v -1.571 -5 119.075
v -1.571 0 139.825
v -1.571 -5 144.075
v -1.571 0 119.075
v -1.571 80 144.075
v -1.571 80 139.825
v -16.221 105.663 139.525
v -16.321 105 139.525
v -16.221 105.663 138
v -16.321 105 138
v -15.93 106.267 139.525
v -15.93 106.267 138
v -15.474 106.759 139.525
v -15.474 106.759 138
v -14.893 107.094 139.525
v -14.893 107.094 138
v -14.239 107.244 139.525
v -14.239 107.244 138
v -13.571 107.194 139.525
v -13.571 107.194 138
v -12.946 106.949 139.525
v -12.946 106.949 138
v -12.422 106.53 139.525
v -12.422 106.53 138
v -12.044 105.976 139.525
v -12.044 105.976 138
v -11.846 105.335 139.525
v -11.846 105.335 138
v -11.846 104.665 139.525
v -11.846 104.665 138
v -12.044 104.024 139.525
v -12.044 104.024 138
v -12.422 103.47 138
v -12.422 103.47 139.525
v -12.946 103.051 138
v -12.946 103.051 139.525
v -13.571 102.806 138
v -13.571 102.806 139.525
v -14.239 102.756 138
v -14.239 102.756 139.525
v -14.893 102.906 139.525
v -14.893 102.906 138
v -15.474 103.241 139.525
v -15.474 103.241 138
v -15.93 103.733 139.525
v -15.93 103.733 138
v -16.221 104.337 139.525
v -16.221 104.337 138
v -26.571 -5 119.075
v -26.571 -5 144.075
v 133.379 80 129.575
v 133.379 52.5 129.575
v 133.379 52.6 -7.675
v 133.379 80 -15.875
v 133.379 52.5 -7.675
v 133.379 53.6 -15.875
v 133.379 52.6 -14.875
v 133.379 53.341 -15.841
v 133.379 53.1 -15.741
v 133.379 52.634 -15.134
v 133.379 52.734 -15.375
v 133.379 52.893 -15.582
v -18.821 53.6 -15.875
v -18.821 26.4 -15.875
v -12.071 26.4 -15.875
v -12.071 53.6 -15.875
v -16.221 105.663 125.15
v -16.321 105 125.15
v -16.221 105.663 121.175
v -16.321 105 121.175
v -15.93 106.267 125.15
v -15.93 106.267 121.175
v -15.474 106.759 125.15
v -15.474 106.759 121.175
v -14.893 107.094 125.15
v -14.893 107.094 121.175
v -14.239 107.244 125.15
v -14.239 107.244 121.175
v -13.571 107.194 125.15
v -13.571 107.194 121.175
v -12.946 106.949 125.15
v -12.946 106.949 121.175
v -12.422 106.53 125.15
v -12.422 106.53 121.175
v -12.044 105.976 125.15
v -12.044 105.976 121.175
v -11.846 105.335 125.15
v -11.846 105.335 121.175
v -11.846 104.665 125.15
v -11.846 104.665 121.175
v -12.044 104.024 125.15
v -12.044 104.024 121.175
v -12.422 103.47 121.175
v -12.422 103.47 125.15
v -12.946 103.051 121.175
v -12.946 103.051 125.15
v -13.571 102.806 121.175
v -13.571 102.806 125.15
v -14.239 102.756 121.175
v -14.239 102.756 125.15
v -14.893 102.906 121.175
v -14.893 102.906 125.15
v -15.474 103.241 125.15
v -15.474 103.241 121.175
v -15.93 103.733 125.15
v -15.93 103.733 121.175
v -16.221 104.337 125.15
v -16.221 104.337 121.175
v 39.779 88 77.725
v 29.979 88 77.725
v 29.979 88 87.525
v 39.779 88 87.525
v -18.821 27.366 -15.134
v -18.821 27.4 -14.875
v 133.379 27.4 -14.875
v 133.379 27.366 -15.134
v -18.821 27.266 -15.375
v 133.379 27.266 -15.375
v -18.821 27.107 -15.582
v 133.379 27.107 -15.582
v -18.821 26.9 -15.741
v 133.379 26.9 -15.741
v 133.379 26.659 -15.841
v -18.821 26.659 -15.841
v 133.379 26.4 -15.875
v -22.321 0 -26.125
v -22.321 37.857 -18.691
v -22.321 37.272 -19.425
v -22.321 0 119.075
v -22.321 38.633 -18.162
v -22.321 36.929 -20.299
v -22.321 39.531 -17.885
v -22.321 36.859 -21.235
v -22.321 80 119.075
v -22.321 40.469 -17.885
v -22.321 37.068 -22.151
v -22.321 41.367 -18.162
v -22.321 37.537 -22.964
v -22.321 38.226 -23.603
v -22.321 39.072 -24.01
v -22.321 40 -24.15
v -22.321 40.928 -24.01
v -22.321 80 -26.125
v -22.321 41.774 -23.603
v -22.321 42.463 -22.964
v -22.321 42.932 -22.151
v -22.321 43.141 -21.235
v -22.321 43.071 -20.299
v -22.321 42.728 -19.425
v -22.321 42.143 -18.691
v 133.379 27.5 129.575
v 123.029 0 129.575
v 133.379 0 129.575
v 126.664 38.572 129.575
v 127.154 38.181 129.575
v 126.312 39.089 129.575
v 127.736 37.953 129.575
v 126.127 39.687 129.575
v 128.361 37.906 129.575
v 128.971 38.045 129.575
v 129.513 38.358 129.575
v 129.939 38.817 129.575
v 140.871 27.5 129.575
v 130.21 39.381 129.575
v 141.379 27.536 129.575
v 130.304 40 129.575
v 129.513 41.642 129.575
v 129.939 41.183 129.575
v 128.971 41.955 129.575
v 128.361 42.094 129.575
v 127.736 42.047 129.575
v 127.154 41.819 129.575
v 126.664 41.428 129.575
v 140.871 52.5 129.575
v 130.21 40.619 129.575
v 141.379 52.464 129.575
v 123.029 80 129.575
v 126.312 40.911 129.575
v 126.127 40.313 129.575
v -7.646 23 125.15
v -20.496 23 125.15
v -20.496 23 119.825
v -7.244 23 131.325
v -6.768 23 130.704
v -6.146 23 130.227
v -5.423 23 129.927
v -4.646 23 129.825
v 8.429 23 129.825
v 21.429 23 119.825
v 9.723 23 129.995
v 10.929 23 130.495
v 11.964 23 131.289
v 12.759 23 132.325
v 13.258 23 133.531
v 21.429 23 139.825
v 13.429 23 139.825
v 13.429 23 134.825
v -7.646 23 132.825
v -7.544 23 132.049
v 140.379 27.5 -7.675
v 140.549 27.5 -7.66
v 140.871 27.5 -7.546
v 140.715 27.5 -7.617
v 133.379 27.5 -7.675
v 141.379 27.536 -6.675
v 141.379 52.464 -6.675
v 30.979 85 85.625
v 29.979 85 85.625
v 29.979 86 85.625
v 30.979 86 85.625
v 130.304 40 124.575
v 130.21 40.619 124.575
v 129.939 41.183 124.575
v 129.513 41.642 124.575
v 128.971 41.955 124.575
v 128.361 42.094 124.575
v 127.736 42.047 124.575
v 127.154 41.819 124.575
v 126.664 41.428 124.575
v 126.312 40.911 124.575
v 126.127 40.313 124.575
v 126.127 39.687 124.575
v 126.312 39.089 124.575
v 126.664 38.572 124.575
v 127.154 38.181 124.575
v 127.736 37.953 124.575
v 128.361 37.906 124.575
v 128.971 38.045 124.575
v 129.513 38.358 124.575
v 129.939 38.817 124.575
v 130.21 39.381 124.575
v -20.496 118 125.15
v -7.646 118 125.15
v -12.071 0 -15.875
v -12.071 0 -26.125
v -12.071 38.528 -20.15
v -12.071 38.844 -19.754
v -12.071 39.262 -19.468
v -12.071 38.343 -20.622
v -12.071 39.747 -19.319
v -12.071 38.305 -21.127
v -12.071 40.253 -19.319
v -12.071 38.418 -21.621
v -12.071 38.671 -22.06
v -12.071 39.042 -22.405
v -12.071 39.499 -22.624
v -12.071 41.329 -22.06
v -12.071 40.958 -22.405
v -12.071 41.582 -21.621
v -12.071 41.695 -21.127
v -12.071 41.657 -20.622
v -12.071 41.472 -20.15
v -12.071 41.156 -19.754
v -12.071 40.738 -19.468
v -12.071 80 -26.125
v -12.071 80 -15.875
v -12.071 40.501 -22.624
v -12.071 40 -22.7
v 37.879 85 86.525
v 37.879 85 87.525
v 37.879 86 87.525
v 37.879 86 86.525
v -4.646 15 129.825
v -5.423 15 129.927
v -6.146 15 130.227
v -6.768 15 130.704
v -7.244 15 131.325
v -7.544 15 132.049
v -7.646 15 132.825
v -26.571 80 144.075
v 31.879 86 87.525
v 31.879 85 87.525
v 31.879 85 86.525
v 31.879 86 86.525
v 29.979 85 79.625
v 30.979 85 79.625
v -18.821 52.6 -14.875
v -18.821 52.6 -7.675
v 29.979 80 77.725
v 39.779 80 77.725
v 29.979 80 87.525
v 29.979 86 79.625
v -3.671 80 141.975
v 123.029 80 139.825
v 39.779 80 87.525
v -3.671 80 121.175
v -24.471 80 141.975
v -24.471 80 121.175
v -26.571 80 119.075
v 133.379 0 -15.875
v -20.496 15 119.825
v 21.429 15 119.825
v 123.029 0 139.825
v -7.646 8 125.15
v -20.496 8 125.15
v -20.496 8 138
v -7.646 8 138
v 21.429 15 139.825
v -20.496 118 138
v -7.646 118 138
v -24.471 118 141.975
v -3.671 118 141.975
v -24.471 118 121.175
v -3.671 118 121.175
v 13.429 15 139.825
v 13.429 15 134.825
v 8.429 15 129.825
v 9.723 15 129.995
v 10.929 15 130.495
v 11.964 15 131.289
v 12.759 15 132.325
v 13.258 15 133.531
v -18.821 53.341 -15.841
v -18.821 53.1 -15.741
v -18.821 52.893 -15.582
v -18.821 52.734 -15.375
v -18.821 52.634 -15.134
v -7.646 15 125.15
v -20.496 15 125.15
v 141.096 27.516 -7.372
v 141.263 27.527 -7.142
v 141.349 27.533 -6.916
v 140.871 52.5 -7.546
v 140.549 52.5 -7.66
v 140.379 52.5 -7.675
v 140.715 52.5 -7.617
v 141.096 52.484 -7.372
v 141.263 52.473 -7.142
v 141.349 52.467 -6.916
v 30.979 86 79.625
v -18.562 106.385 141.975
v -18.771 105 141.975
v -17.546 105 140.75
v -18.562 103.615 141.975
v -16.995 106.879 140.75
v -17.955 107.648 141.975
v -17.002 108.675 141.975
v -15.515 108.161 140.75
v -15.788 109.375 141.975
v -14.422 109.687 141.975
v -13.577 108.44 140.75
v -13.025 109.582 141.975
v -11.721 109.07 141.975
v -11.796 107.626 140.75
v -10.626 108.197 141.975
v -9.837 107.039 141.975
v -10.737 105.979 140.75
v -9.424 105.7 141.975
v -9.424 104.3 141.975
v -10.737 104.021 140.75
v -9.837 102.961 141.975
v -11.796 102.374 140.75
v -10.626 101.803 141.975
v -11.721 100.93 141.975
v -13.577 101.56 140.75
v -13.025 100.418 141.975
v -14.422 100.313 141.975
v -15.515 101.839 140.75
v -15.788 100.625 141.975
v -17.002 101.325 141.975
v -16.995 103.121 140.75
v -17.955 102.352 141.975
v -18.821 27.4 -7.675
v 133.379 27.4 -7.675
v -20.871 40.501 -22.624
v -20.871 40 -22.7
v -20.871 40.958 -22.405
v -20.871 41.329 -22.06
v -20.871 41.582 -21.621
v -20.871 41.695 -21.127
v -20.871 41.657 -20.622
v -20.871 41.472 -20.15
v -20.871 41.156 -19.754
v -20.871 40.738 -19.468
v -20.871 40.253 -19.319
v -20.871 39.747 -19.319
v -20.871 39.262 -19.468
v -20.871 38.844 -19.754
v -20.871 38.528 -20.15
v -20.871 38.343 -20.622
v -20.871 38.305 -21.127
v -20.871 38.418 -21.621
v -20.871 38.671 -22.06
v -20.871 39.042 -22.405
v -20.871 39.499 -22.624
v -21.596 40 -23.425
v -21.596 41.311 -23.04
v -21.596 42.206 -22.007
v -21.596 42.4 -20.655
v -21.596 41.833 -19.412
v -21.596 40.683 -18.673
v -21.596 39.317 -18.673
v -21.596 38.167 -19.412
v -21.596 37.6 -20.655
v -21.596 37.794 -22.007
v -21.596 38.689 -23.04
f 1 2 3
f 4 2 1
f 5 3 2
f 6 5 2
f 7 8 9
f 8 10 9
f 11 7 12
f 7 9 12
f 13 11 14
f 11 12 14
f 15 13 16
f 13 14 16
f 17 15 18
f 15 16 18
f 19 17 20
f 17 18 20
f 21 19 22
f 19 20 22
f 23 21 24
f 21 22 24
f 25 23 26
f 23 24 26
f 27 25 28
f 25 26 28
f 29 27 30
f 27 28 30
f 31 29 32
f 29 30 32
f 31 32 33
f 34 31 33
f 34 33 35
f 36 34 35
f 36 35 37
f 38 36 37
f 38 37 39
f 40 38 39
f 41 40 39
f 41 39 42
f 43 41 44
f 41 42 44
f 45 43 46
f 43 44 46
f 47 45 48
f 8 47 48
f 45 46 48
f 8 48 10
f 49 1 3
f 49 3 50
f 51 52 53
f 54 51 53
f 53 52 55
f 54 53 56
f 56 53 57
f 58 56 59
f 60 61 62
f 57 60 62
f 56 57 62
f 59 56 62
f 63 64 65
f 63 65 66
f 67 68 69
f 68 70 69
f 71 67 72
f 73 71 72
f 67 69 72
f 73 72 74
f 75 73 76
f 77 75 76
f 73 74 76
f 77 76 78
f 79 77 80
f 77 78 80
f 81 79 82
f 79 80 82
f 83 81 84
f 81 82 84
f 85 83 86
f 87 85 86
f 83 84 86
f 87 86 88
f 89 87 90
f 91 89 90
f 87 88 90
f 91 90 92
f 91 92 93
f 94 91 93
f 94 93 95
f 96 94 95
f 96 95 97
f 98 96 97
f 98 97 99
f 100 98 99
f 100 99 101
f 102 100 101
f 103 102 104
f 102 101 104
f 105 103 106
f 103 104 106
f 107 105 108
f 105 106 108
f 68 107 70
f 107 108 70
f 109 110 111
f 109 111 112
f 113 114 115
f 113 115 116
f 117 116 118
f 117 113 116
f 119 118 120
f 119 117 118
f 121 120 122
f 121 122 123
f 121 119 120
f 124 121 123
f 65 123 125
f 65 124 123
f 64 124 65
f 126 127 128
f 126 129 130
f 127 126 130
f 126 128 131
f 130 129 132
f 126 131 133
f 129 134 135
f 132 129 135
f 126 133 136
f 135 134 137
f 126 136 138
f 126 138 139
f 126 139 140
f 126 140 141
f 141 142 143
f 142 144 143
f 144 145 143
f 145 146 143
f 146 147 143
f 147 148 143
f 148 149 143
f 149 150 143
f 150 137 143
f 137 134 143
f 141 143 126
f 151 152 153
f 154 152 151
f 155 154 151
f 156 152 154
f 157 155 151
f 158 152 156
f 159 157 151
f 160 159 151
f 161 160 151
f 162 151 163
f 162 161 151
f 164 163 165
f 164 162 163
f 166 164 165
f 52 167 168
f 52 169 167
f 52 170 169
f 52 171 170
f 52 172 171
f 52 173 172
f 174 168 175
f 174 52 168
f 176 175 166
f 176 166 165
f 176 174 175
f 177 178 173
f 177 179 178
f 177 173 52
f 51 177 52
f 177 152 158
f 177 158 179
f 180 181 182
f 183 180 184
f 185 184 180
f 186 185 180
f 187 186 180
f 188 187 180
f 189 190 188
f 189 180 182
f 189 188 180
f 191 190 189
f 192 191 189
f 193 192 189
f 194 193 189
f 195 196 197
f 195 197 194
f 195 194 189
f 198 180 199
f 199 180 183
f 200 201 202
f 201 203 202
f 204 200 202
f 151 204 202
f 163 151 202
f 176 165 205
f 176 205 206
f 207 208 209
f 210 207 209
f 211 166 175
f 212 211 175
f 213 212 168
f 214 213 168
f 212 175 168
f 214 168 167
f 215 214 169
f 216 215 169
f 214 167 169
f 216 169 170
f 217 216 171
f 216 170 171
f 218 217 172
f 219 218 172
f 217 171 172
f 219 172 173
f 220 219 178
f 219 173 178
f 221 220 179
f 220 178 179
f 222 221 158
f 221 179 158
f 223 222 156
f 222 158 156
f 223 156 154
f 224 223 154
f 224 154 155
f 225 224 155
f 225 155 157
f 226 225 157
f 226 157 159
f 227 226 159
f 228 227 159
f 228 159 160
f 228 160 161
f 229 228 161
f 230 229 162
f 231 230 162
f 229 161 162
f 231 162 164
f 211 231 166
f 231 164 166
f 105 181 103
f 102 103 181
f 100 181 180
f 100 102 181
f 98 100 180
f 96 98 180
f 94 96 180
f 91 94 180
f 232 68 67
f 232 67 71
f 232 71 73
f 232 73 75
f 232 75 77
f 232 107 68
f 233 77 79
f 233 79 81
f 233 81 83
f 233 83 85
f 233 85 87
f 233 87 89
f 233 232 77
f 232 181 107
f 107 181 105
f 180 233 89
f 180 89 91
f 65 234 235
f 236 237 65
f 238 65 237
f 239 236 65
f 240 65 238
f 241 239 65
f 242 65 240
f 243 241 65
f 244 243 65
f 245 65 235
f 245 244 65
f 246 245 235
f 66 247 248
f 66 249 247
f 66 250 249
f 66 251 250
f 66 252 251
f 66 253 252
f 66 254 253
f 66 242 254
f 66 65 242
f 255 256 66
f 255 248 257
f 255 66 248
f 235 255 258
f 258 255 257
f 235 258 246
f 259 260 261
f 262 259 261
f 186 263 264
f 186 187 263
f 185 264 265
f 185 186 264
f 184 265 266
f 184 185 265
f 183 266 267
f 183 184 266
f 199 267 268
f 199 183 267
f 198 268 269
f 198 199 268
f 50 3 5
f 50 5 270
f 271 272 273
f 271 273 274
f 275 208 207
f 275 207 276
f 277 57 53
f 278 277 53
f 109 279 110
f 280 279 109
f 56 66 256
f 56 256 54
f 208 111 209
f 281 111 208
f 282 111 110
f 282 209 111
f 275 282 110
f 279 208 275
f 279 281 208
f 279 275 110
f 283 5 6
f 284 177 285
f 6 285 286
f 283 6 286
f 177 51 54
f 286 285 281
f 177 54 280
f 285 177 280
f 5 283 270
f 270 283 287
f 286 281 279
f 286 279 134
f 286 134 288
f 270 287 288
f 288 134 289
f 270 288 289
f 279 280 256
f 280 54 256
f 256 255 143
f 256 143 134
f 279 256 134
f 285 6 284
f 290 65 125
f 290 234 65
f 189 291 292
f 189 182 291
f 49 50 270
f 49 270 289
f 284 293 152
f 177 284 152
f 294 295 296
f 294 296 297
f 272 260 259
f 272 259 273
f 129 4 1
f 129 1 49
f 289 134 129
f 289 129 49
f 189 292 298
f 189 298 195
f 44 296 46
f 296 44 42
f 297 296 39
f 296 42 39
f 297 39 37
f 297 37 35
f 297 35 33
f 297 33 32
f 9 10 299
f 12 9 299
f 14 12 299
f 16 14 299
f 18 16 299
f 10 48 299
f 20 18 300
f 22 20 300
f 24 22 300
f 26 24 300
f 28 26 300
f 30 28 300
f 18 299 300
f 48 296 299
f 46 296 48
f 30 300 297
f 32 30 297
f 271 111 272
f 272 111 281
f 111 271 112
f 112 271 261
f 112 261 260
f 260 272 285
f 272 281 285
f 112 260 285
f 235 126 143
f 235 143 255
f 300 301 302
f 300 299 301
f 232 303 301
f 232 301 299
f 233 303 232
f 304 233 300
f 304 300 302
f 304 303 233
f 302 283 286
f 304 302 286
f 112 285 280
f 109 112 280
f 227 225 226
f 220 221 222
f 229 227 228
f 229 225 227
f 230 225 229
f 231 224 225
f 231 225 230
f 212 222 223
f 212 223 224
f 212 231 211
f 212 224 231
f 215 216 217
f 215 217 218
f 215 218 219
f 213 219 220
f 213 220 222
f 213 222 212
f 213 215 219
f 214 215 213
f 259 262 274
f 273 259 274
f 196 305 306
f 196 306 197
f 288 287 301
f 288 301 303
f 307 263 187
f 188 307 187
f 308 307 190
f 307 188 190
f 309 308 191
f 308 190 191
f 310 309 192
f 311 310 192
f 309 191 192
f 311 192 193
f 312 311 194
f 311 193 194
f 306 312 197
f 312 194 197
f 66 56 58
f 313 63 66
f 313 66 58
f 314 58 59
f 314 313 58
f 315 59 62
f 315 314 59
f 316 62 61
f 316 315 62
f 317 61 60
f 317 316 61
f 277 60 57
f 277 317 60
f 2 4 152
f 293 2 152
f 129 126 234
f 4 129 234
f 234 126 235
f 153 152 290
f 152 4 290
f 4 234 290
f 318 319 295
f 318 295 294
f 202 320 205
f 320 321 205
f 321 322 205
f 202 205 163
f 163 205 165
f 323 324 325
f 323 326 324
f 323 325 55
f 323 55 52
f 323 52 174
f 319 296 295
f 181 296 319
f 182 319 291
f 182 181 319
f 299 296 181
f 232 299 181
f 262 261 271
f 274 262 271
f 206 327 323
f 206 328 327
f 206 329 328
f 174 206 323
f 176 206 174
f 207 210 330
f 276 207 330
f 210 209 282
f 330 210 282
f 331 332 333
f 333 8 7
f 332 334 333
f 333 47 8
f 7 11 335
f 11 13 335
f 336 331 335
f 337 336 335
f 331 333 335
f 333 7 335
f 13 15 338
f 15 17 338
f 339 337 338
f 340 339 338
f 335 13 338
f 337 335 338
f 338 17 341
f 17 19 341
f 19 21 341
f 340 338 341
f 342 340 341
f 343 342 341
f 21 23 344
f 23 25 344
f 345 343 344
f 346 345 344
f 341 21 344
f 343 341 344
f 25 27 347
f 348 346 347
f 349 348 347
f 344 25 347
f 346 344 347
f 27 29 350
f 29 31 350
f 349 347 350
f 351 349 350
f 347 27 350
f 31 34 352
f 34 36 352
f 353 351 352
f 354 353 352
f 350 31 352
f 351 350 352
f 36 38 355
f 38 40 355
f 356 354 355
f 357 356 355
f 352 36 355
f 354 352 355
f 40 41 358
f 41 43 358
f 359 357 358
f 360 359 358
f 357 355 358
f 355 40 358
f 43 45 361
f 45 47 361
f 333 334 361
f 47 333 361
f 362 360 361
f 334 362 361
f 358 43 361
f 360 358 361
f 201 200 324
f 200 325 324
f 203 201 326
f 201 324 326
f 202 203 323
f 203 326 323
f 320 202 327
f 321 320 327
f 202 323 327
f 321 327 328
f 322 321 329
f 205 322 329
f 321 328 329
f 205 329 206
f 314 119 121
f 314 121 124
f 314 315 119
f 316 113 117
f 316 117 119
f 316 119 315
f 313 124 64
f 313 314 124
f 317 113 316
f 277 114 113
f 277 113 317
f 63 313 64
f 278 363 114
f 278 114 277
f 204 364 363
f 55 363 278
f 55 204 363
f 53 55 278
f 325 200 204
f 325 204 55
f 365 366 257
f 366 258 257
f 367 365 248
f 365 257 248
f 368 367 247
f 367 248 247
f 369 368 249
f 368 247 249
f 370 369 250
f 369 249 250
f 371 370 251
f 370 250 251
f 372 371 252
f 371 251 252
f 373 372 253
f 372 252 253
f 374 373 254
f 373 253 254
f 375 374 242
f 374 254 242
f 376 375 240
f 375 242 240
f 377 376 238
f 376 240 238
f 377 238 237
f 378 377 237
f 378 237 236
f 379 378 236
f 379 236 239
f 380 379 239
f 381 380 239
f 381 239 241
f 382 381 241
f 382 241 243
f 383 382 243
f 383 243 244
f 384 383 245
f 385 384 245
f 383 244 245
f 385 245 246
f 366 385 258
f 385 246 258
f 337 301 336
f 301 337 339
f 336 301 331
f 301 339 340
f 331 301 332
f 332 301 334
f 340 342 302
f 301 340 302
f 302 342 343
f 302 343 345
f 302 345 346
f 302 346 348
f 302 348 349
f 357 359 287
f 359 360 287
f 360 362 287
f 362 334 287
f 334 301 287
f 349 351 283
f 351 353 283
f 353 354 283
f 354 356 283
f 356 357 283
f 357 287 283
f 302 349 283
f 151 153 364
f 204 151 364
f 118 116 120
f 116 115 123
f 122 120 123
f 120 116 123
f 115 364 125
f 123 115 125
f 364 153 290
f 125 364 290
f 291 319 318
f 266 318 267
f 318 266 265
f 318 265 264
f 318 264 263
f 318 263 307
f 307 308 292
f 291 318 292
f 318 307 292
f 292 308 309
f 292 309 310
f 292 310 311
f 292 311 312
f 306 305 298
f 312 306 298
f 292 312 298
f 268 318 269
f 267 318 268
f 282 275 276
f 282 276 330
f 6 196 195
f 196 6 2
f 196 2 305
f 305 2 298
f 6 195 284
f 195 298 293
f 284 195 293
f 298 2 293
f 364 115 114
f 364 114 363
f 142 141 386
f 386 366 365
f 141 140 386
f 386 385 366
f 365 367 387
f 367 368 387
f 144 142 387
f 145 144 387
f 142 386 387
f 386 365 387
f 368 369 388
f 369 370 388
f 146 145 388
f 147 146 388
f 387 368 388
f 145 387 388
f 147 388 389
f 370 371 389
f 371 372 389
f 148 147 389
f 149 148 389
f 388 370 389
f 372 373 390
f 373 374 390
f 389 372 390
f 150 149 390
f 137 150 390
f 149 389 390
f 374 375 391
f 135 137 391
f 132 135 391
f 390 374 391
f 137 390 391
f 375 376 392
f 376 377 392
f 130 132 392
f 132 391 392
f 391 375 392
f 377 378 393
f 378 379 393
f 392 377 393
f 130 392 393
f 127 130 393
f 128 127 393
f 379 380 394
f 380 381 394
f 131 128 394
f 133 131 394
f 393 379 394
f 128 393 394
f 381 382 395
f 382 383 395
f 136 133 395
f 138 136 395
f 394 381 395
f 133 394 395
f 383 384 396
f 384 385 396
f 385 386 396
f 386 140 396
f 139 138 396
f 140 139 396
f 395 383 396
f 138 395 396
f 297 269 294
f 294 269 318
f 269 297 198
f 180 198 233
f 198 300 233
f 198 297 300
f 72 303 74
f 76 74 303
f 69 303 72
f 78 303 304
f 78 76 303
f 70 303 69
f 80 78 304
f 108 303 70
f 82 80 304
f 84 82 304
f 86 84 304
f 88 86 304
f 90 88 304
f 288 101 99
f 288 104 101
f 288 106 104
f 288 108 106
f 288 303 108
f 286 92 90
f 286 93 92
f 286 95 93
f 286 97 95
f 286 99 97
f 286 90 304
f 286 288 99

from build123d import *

# Parameters (mm, degrees)
SKETCH1_W                                           = 155.7
SKETCH1_H                                           = 155.7
BOSS_EXTRUDE2_DEPTH                                 = 80
SKETCH3_W                                           = 8
SKETCH3_H                                           = 25
BOSS_EXTRUDE4_DEPTH                                 = 145.45
CHAMFER1_SIZE                                       = 0.508
CHAMFER1_SIZE2                                      = 0.03552282
CHAMFER2_SIZE                                       = 0.508
CHAMFER2_SIZE2                                      = 0.03552282
SKETCH4_W                                           = 8.2
SKETCH4_H                                           = 25.2
CUT_EXTRUDE6_DEPTH                                  = 160.2
FILLET1_R                                           = 1
SKETCH6_W                                           = 10.35
SKETCH6_H                                           = 10.25
CUT_EXTRUDE7_DEPTH                                  = 80
SKETCH7_W                                           = 10.25
SKETCH7_H                                           = 10.25
BOSS_EXTRUDE5_DEPTH                                 = 80
CSK_FOR_M3_COUNTERSUNK_FLAT_HEAD_SCREW1_D           = 3.4
CSK_FOR_M3_COUNTERSUNK_FLAT_HEAD_SCREW1_DEPTH       = 16
CSK_FOR_M3_COUNTERSUNK_FLAT_HEAD_SCREW1_CSINK_D     = 6.3
CSK_FOR_M3_COUNTERSUNK_FLAT_HEAD_SCREW1_CSINK_ANGLE = 90
CSK_FOR_M3_COUNTERSUNK_FLAT_HEAD_SCREW1_TIP         = 1.021463052
SKETCH12_R                                          = 2.1
CUT_EXTRUDE9_DEPTH                                  = 5
FILLET2_START                                       = -18.821212121
FILLET2_DEPTH                                       = 152.821212121
FILLET3_START                                       = -18.821212121
FILLET3_DEPTH                                       = 152.821212121
SKETCH14_W                                          = 9.8
SKETCH14_H                                          = 9.8
BOSS_EXTRUDE6_DEPTH                                 = 8
CUT_EXTRUDE12_START                                 = -9.8
SKETCH17_W                                          = 6
SKETCH17_H                                          = 1
CUT_EXTRUDE12_DEPTH                                 = 1
CUT_EXTRUDE13_START                                 = -9.8
SKETCH19_W                                          = 6
SKETCH19_H                                          = 1
CUT_EXTRUDE13_DEPTH                                 = 1
BOSS_EXTRUDE7_DEPTH                                 = 5
BOSS_EXTRUDE7_DEPTH_BACK                            = 80
SKETCH20_W                                          = 25
SKETCH20_H                                          = 25
SKETCH21_W                                          = 20.8
SKETCH21_H                                          = 20.8
BOSS_EXTRUDE8_DEPTH                                 = 38
SKETCH23_W                                          = 12.85
SKETCH23_H                                          = 12.85
CUT_EXTRUDE14_DEPTH                                 = 110
CSK_FOR_M4_COUNTERSUNK_FLAT_HEAD_SCREW1_D           = 4.5
CSK_FOR_M4_COUNTERSUNK_FLAT_HEAD_SCREW1_DEPTH       = 26
CSK_FOR_M4_COUNTERSUNK_FLAT_HEAD_SCREW1_CSINK_D     = 9.4
CSK_FOR_M4_COUNTERSUNK_FLAT_HEAD_SCREW1_CSINK_ANGLE = 90
CSK_FOR_M4_COUNTERSUNK_FLAT_HEAD_SCREW1_TIP         = 1.351936393
SKETCH27_W                                          = 8
SKETCH27_H                                          = 8
CUT_EXTRUDE15_DEPTH                                 = 20
SKETCH28_W                                          = 10
SKETCH28_H                                          = 8
CUT_EXTRUDE16_DEPTH                                 = 33.925
FILLET4_R                                           = 5
FILLET5_R                                           = 3


with BuildPart() as part:
    # Sketch1 → Boss-Extrude2 (new body)
    with BuildSketch(Plane(origin=(0, 0, 0), x_dir=(1, 0, 0), z_dir=(0, 1, 0))):
        with Locations((55.528787879, -61.975)):
            Rectangle(SKETCH1_W, SKETCH1_H)
    extrude(amount=BOSS_EXTRUDE2_DEPTH)

    # Sketch3 → Boss-Extrude4 (add)
    with BuildSketch(Plane.XY.offset(-15.875)):
        with Locations((137.378787879, 40)):
            Rectangle(SKETCH3_W, SKETCH3_H)
    extrude(amount=BOSS_EXTRUDE4_DEPTH)

    # Chamfer1
    chamfer1_edges = [part.edges().sort_by_distance(p)[0] for p in [
        (141.378787879, 52.5, 56.85),
    ]]
    chamfer1_side = [part.faces().sort_by_distance(p)[0] for p in [
        (137.378787879, 52.5, 56.85),
    ]]
    chamfer(chamfer1_edges, length=CHAMFER1_SIZE, length2=CHAMFER1_SIZE2, reference=chamfer1_side[0])

    # Chamfer2
    chamfer2_edges = [part.edges().sort_by_distance(p)[0] for p in [
        (141.378787879, 27.5, 56.85),
    ]]
    chamfer2_side = [part.faces().sort_by_distance(p)[0] for p in [
        (137.378787879, 27.5, 56.85),
    ]]
    chamfer(chamfer2_edges, length=CHAMFER2_SIZE, length2=CHAMFER2_SIZE2, reference=chamfer2_side[0])

    # Sketch4 → Cut-Extrude6 (cut)
    with BuildSketch(Plane.ZY.offset(-141.378787879)):
        with Locations((-11.775, 40)):
            Rectangle(SKETCH4_W, SKETCH4_H)
    extrude(amount=CUT_EXTRUDE6_DEPTH, mode=Mode.SUBTRACT)

    # Fillet1
    fillet1_edges = [part.edges().sort_by_distance(p)[0] for p in [
        (141.378787879, 40, -7.675),
    ]]
    fillet(fillet1_edges, radius=FILLET1_R)

    # Sketch6 → Cut-Extrude7 (cut)
    with BuildSketch(Plane(origin=(0, 80, 0), x_dir=(1, 0, 0), z_dir=(0, 1, 0))):
        with Locations((128.203787879, -134.7)):
            Rectangle(SKETCH6_W, SKETCH6_H)
    extrude(amount=-CUT_EXTRUDE7_DEPTH, mode=Mode.SUBTRACT)

    # Sketch7 → Boss-Extrude5 (add)
    with BuildSketch(Plane(origin=(0, 80, 0), x_dir=(1, 0, 0), z_dir=(0, 1, 0))):
        with Locations((-17.196212121, 21)):
            Rectangle(SKETCH7_W, SKETCH7_H)
    extrude(amount=-BOSS_EXTRUDE5_DEPTH)

    # CSK for M3 Countersunk Flat Head Screw1
    with Locations(Plane.ZY.offset(22.321212121)):
        with Locations((-21, 40)):
            CounterSinkHole(CSK_FOR_M3_COUNTERSUNK_FLAT_HEAD_SCREW1_D / 2, CSK_FOR_M3_COUNTERSUNK_FLAT_HEAD_SCREW1_CSINK_D / 2, depth=CSK_FOR_M3_COUNTERSUNK_FLAT_HEAD_SCREW1_DEPTH, counter_sink_angle=CSK_FOR_M3_COUNTERSUNK_FLAT_HEAD_SCREW1_CSINK_ANGLE)
            with Locations((0, 0, -(CSK_FOR_M3_COUNTERSUNK_FLAT_HEAD_SCREW1_DEPTH + CSK_FOR_M3_COUNTERSUNK_FLAT_HEAD_SCREW1_TIP / 2))):  # 118° drill point
                Cone(0, CSK_FOR_M3_COUNTERSUNK_FLAT_HEAD_SCREW1_D / 2, CSK_FOR_M3_COUNTERSUNK_FLAT_HEAD_SCREW1_TIP, mode=Mode.SUBTRACT)

    # Sketch12 → Cut-Extrude9 (cut)
    with BuildSketch(Plane.XY.offset(129.575)):
        with Locations((128.203787879, 40)):
            Circle(SKETCH12_R)
    extrude(amount=-CUT_EXTRUDE9_DEPTH, mode=Mode.SUBTRACT)

    # Fillet2: read off the stored shape, not the designer's step
    # Fillet2 outline → Fillet2 (cut)
    with BuildSketch(Plane.YZ.offset(FILLET2_START)):
        with BuildLine():
            Line((52.6, -15.875), (53.6, -15.875))
            ThreePointArc((53.6, -15.875), (52.892893219, -15.582106781), (52.6, -14.875))
            Line((52.6, -14.875), (52.6, -15.875))
        make_face()
    extrude(amount=FILLET2_DEPTH, mode=Mode.SUBTRACT)

    # Fillet3: read off the stored shape, not the designer's step
    # Fillet3 outline → Fillet3 (cut)
    with BuildSketch(Plane.YZ.offset(FILLET3_START)):
        with BuildLine():
            ThreePointArc((27.4, -14.875), (27.107106781, -15.582106781), (26.4, -15.875))
            Line((26.4, -15.875), (27.4, -15.875))
            Line((27.4, -15.875), (27.4, -14.875))
        make_face()
    extrude(amount=FILLET3_DEPTH, mode=Mode.SUBTRACT)

    # Sketch14 → Boss-Extrude6 (add)
    with BuildSketch(Plane(origin=(0, 80, 0), x_dir=(1, 0, 0), z_dir=(0, 1, 0))):
        with Locations((34.878787879, -82.625)):
            Rectangle(SKETCH14_W, SKETCH14_H)
    extrude(amount=BOSS_EXTRUDE6_DEPTH)

    # Sketch17 → Cut-Extrude12 (cut)
    with BuildSketch(Plane(origin=(39.778787879, 0, 0), x_dir=(0, 0, -1), z_dir=(1, 0, 0)).offset(CUT_EXTRUDE12_START)):
        with Locations((-82.625, 85.5)):
            Rectangle(SKETCH17_W, SKETCH17_H)
    extrude(amount=CUT_EXTRUDE12_DEPTH, mode=Mode.SUBTRACT)

    # Sketch19 → Cut-Extrude13 (cut)
    with BuildSketch(Plane(origin=(0, 0, 77.725), x_dir=(-1, 0, 0), z_dir=(0, 0, -1)).offset(CUT_EXTRUDE13_START)):
        with Locations((-34.878787879, 85.5)):
            Rectangle(SKETCH19_W, SKETCH19_H)
    extrude(amount=CUT_EXTRUDE13_DEPTH, mode=Mode.SUBTRACT)

    # Sketch20 → Boss-Extrude7 (add, two sides: drawn at the far end of the back side and taken through both)
    with BuildSketch(Plane(origin=(0, 0, 0), x_dir=(-1, 0, 0), z_dir=(0, -1, 0)).offset(-BOSS_EXTRUDE7_DEPTH_BACK)):
        with Locations((14.071212121, -131.575)):
            Rectangle(SKETCH20_W, SKETCH20_H)
    extrude(amount=BOSS_EXTRUDE7_DEPTH + BOSS_EXTRUDE7_DEPTH_BACK)

    # Sketch21 → Boss-Extrude8 (add)
    with BuildSketch(Plane(origin=(0, 80, 0), x_dir=(1, 0, 0), z_dir=(0, 1, 0))):
        with Locations((-14.071212121, -131.575)):
            Rectangle(SKETCH21_W, SKETCH21_H)
    extrude(amount=BOSS_EXTRUDE8_DEPTH)

    # Sketch23 → Cut-Extrude14 (cut)
    with BuildSketch(Plane(origin=(0, 118, 0), x_dir=(1, 0, 0), z_dir=(0, 1, 0))):
        with Locations((-14.071212121, -131.575)):
            Rectangle(SKETCH23_W, SKETCH23_H)
    extrude(amount=-CUT_EXTRUDE14_DEPTH, mode=Mode.SUBTRACT)

    # CSK for M4 Countersunk Flat Head Screw1
    with Locations(Plane.XY.offset(141.975)):
        with Locations((-14.071212121, 105)):
            CounterSinkHole(CSK_FOR_M4_COUNTERSUNK_FLAT_HEAD_SCREW1_D / 2, CSK_FOR_M4_COUNTERSUNK_FLAT_HEAD_SCREW1_CSINK_D / 2, depth=CSK_FOR_M4_COUNTERSUNK_FLAT_HEAD_SCREW1_DEPTH, counter_sink_angle=CSK_FOR_M4_COUNTERSUNK_FLAT_HEAD_SCREW1_CSINK_ANGLE)
            with Locations((0, 0, -(CSK_FOR_M4_COUNTERSUNK_FLAT_HEAD_SCREW1_DEPTH + CSK_FOR_M4_COUNTERSUNK_FLAT_HEAD_SCREW1_TIP / 2))):  # 118° drill point
                Cone(0, CSK_FOR_M4_COUNTERSUNK_FLAT_HEAD_SCREW1_D / 2, CSK_FOR_M4_COUNTERSUNK_FLAT_HEAD_SCREW1_TIP, mode=Mode.SUBTRACT)

    # Sketch27 → Cut-Extrude15 (cut)
    with BuildSketch(Plane.XY.offset(139.825)):
        with Locations((17.428787879, 19)):
            Rectangle(SKETCH27_W, SKETCH27_H)
    extrude(amount=-CUT_EXTRUDE15_DEPTH, mode=Mode.SUBTRACT)

    # Sketch28 → Cut-Extrude16 (cut)
    with BuildSketch(Plane(origin=(13.428787879, 0, 0), x_dir=(0, 0, -1), z_dir=(1, 0, 0))):
        with Locations((-124.825, 19)):
            Rectangle(SKETCH28_W, SKETCH28_H)
    extrude(amount=-CUT_EXTRUDE16_DEPTH, mode=Mode.SUBTRACT)

    # Fillet4
    fillet4_edges = [part.edges().sort_by_distance(p)[0] for p in [
        (13.428787879, 19, 129.825),
    ]]
    fillet(fillet4_edges, radius=FILLET4_R)

    # Fillet5
    fillet5_edges = [part.edges().sort_by_distance(p)[0] for p in [
        (-7.646212121, 19, 129.825),
    ]]
    fillet(fillet5_edges, radius=FILLET5_R)


solid = part.part
